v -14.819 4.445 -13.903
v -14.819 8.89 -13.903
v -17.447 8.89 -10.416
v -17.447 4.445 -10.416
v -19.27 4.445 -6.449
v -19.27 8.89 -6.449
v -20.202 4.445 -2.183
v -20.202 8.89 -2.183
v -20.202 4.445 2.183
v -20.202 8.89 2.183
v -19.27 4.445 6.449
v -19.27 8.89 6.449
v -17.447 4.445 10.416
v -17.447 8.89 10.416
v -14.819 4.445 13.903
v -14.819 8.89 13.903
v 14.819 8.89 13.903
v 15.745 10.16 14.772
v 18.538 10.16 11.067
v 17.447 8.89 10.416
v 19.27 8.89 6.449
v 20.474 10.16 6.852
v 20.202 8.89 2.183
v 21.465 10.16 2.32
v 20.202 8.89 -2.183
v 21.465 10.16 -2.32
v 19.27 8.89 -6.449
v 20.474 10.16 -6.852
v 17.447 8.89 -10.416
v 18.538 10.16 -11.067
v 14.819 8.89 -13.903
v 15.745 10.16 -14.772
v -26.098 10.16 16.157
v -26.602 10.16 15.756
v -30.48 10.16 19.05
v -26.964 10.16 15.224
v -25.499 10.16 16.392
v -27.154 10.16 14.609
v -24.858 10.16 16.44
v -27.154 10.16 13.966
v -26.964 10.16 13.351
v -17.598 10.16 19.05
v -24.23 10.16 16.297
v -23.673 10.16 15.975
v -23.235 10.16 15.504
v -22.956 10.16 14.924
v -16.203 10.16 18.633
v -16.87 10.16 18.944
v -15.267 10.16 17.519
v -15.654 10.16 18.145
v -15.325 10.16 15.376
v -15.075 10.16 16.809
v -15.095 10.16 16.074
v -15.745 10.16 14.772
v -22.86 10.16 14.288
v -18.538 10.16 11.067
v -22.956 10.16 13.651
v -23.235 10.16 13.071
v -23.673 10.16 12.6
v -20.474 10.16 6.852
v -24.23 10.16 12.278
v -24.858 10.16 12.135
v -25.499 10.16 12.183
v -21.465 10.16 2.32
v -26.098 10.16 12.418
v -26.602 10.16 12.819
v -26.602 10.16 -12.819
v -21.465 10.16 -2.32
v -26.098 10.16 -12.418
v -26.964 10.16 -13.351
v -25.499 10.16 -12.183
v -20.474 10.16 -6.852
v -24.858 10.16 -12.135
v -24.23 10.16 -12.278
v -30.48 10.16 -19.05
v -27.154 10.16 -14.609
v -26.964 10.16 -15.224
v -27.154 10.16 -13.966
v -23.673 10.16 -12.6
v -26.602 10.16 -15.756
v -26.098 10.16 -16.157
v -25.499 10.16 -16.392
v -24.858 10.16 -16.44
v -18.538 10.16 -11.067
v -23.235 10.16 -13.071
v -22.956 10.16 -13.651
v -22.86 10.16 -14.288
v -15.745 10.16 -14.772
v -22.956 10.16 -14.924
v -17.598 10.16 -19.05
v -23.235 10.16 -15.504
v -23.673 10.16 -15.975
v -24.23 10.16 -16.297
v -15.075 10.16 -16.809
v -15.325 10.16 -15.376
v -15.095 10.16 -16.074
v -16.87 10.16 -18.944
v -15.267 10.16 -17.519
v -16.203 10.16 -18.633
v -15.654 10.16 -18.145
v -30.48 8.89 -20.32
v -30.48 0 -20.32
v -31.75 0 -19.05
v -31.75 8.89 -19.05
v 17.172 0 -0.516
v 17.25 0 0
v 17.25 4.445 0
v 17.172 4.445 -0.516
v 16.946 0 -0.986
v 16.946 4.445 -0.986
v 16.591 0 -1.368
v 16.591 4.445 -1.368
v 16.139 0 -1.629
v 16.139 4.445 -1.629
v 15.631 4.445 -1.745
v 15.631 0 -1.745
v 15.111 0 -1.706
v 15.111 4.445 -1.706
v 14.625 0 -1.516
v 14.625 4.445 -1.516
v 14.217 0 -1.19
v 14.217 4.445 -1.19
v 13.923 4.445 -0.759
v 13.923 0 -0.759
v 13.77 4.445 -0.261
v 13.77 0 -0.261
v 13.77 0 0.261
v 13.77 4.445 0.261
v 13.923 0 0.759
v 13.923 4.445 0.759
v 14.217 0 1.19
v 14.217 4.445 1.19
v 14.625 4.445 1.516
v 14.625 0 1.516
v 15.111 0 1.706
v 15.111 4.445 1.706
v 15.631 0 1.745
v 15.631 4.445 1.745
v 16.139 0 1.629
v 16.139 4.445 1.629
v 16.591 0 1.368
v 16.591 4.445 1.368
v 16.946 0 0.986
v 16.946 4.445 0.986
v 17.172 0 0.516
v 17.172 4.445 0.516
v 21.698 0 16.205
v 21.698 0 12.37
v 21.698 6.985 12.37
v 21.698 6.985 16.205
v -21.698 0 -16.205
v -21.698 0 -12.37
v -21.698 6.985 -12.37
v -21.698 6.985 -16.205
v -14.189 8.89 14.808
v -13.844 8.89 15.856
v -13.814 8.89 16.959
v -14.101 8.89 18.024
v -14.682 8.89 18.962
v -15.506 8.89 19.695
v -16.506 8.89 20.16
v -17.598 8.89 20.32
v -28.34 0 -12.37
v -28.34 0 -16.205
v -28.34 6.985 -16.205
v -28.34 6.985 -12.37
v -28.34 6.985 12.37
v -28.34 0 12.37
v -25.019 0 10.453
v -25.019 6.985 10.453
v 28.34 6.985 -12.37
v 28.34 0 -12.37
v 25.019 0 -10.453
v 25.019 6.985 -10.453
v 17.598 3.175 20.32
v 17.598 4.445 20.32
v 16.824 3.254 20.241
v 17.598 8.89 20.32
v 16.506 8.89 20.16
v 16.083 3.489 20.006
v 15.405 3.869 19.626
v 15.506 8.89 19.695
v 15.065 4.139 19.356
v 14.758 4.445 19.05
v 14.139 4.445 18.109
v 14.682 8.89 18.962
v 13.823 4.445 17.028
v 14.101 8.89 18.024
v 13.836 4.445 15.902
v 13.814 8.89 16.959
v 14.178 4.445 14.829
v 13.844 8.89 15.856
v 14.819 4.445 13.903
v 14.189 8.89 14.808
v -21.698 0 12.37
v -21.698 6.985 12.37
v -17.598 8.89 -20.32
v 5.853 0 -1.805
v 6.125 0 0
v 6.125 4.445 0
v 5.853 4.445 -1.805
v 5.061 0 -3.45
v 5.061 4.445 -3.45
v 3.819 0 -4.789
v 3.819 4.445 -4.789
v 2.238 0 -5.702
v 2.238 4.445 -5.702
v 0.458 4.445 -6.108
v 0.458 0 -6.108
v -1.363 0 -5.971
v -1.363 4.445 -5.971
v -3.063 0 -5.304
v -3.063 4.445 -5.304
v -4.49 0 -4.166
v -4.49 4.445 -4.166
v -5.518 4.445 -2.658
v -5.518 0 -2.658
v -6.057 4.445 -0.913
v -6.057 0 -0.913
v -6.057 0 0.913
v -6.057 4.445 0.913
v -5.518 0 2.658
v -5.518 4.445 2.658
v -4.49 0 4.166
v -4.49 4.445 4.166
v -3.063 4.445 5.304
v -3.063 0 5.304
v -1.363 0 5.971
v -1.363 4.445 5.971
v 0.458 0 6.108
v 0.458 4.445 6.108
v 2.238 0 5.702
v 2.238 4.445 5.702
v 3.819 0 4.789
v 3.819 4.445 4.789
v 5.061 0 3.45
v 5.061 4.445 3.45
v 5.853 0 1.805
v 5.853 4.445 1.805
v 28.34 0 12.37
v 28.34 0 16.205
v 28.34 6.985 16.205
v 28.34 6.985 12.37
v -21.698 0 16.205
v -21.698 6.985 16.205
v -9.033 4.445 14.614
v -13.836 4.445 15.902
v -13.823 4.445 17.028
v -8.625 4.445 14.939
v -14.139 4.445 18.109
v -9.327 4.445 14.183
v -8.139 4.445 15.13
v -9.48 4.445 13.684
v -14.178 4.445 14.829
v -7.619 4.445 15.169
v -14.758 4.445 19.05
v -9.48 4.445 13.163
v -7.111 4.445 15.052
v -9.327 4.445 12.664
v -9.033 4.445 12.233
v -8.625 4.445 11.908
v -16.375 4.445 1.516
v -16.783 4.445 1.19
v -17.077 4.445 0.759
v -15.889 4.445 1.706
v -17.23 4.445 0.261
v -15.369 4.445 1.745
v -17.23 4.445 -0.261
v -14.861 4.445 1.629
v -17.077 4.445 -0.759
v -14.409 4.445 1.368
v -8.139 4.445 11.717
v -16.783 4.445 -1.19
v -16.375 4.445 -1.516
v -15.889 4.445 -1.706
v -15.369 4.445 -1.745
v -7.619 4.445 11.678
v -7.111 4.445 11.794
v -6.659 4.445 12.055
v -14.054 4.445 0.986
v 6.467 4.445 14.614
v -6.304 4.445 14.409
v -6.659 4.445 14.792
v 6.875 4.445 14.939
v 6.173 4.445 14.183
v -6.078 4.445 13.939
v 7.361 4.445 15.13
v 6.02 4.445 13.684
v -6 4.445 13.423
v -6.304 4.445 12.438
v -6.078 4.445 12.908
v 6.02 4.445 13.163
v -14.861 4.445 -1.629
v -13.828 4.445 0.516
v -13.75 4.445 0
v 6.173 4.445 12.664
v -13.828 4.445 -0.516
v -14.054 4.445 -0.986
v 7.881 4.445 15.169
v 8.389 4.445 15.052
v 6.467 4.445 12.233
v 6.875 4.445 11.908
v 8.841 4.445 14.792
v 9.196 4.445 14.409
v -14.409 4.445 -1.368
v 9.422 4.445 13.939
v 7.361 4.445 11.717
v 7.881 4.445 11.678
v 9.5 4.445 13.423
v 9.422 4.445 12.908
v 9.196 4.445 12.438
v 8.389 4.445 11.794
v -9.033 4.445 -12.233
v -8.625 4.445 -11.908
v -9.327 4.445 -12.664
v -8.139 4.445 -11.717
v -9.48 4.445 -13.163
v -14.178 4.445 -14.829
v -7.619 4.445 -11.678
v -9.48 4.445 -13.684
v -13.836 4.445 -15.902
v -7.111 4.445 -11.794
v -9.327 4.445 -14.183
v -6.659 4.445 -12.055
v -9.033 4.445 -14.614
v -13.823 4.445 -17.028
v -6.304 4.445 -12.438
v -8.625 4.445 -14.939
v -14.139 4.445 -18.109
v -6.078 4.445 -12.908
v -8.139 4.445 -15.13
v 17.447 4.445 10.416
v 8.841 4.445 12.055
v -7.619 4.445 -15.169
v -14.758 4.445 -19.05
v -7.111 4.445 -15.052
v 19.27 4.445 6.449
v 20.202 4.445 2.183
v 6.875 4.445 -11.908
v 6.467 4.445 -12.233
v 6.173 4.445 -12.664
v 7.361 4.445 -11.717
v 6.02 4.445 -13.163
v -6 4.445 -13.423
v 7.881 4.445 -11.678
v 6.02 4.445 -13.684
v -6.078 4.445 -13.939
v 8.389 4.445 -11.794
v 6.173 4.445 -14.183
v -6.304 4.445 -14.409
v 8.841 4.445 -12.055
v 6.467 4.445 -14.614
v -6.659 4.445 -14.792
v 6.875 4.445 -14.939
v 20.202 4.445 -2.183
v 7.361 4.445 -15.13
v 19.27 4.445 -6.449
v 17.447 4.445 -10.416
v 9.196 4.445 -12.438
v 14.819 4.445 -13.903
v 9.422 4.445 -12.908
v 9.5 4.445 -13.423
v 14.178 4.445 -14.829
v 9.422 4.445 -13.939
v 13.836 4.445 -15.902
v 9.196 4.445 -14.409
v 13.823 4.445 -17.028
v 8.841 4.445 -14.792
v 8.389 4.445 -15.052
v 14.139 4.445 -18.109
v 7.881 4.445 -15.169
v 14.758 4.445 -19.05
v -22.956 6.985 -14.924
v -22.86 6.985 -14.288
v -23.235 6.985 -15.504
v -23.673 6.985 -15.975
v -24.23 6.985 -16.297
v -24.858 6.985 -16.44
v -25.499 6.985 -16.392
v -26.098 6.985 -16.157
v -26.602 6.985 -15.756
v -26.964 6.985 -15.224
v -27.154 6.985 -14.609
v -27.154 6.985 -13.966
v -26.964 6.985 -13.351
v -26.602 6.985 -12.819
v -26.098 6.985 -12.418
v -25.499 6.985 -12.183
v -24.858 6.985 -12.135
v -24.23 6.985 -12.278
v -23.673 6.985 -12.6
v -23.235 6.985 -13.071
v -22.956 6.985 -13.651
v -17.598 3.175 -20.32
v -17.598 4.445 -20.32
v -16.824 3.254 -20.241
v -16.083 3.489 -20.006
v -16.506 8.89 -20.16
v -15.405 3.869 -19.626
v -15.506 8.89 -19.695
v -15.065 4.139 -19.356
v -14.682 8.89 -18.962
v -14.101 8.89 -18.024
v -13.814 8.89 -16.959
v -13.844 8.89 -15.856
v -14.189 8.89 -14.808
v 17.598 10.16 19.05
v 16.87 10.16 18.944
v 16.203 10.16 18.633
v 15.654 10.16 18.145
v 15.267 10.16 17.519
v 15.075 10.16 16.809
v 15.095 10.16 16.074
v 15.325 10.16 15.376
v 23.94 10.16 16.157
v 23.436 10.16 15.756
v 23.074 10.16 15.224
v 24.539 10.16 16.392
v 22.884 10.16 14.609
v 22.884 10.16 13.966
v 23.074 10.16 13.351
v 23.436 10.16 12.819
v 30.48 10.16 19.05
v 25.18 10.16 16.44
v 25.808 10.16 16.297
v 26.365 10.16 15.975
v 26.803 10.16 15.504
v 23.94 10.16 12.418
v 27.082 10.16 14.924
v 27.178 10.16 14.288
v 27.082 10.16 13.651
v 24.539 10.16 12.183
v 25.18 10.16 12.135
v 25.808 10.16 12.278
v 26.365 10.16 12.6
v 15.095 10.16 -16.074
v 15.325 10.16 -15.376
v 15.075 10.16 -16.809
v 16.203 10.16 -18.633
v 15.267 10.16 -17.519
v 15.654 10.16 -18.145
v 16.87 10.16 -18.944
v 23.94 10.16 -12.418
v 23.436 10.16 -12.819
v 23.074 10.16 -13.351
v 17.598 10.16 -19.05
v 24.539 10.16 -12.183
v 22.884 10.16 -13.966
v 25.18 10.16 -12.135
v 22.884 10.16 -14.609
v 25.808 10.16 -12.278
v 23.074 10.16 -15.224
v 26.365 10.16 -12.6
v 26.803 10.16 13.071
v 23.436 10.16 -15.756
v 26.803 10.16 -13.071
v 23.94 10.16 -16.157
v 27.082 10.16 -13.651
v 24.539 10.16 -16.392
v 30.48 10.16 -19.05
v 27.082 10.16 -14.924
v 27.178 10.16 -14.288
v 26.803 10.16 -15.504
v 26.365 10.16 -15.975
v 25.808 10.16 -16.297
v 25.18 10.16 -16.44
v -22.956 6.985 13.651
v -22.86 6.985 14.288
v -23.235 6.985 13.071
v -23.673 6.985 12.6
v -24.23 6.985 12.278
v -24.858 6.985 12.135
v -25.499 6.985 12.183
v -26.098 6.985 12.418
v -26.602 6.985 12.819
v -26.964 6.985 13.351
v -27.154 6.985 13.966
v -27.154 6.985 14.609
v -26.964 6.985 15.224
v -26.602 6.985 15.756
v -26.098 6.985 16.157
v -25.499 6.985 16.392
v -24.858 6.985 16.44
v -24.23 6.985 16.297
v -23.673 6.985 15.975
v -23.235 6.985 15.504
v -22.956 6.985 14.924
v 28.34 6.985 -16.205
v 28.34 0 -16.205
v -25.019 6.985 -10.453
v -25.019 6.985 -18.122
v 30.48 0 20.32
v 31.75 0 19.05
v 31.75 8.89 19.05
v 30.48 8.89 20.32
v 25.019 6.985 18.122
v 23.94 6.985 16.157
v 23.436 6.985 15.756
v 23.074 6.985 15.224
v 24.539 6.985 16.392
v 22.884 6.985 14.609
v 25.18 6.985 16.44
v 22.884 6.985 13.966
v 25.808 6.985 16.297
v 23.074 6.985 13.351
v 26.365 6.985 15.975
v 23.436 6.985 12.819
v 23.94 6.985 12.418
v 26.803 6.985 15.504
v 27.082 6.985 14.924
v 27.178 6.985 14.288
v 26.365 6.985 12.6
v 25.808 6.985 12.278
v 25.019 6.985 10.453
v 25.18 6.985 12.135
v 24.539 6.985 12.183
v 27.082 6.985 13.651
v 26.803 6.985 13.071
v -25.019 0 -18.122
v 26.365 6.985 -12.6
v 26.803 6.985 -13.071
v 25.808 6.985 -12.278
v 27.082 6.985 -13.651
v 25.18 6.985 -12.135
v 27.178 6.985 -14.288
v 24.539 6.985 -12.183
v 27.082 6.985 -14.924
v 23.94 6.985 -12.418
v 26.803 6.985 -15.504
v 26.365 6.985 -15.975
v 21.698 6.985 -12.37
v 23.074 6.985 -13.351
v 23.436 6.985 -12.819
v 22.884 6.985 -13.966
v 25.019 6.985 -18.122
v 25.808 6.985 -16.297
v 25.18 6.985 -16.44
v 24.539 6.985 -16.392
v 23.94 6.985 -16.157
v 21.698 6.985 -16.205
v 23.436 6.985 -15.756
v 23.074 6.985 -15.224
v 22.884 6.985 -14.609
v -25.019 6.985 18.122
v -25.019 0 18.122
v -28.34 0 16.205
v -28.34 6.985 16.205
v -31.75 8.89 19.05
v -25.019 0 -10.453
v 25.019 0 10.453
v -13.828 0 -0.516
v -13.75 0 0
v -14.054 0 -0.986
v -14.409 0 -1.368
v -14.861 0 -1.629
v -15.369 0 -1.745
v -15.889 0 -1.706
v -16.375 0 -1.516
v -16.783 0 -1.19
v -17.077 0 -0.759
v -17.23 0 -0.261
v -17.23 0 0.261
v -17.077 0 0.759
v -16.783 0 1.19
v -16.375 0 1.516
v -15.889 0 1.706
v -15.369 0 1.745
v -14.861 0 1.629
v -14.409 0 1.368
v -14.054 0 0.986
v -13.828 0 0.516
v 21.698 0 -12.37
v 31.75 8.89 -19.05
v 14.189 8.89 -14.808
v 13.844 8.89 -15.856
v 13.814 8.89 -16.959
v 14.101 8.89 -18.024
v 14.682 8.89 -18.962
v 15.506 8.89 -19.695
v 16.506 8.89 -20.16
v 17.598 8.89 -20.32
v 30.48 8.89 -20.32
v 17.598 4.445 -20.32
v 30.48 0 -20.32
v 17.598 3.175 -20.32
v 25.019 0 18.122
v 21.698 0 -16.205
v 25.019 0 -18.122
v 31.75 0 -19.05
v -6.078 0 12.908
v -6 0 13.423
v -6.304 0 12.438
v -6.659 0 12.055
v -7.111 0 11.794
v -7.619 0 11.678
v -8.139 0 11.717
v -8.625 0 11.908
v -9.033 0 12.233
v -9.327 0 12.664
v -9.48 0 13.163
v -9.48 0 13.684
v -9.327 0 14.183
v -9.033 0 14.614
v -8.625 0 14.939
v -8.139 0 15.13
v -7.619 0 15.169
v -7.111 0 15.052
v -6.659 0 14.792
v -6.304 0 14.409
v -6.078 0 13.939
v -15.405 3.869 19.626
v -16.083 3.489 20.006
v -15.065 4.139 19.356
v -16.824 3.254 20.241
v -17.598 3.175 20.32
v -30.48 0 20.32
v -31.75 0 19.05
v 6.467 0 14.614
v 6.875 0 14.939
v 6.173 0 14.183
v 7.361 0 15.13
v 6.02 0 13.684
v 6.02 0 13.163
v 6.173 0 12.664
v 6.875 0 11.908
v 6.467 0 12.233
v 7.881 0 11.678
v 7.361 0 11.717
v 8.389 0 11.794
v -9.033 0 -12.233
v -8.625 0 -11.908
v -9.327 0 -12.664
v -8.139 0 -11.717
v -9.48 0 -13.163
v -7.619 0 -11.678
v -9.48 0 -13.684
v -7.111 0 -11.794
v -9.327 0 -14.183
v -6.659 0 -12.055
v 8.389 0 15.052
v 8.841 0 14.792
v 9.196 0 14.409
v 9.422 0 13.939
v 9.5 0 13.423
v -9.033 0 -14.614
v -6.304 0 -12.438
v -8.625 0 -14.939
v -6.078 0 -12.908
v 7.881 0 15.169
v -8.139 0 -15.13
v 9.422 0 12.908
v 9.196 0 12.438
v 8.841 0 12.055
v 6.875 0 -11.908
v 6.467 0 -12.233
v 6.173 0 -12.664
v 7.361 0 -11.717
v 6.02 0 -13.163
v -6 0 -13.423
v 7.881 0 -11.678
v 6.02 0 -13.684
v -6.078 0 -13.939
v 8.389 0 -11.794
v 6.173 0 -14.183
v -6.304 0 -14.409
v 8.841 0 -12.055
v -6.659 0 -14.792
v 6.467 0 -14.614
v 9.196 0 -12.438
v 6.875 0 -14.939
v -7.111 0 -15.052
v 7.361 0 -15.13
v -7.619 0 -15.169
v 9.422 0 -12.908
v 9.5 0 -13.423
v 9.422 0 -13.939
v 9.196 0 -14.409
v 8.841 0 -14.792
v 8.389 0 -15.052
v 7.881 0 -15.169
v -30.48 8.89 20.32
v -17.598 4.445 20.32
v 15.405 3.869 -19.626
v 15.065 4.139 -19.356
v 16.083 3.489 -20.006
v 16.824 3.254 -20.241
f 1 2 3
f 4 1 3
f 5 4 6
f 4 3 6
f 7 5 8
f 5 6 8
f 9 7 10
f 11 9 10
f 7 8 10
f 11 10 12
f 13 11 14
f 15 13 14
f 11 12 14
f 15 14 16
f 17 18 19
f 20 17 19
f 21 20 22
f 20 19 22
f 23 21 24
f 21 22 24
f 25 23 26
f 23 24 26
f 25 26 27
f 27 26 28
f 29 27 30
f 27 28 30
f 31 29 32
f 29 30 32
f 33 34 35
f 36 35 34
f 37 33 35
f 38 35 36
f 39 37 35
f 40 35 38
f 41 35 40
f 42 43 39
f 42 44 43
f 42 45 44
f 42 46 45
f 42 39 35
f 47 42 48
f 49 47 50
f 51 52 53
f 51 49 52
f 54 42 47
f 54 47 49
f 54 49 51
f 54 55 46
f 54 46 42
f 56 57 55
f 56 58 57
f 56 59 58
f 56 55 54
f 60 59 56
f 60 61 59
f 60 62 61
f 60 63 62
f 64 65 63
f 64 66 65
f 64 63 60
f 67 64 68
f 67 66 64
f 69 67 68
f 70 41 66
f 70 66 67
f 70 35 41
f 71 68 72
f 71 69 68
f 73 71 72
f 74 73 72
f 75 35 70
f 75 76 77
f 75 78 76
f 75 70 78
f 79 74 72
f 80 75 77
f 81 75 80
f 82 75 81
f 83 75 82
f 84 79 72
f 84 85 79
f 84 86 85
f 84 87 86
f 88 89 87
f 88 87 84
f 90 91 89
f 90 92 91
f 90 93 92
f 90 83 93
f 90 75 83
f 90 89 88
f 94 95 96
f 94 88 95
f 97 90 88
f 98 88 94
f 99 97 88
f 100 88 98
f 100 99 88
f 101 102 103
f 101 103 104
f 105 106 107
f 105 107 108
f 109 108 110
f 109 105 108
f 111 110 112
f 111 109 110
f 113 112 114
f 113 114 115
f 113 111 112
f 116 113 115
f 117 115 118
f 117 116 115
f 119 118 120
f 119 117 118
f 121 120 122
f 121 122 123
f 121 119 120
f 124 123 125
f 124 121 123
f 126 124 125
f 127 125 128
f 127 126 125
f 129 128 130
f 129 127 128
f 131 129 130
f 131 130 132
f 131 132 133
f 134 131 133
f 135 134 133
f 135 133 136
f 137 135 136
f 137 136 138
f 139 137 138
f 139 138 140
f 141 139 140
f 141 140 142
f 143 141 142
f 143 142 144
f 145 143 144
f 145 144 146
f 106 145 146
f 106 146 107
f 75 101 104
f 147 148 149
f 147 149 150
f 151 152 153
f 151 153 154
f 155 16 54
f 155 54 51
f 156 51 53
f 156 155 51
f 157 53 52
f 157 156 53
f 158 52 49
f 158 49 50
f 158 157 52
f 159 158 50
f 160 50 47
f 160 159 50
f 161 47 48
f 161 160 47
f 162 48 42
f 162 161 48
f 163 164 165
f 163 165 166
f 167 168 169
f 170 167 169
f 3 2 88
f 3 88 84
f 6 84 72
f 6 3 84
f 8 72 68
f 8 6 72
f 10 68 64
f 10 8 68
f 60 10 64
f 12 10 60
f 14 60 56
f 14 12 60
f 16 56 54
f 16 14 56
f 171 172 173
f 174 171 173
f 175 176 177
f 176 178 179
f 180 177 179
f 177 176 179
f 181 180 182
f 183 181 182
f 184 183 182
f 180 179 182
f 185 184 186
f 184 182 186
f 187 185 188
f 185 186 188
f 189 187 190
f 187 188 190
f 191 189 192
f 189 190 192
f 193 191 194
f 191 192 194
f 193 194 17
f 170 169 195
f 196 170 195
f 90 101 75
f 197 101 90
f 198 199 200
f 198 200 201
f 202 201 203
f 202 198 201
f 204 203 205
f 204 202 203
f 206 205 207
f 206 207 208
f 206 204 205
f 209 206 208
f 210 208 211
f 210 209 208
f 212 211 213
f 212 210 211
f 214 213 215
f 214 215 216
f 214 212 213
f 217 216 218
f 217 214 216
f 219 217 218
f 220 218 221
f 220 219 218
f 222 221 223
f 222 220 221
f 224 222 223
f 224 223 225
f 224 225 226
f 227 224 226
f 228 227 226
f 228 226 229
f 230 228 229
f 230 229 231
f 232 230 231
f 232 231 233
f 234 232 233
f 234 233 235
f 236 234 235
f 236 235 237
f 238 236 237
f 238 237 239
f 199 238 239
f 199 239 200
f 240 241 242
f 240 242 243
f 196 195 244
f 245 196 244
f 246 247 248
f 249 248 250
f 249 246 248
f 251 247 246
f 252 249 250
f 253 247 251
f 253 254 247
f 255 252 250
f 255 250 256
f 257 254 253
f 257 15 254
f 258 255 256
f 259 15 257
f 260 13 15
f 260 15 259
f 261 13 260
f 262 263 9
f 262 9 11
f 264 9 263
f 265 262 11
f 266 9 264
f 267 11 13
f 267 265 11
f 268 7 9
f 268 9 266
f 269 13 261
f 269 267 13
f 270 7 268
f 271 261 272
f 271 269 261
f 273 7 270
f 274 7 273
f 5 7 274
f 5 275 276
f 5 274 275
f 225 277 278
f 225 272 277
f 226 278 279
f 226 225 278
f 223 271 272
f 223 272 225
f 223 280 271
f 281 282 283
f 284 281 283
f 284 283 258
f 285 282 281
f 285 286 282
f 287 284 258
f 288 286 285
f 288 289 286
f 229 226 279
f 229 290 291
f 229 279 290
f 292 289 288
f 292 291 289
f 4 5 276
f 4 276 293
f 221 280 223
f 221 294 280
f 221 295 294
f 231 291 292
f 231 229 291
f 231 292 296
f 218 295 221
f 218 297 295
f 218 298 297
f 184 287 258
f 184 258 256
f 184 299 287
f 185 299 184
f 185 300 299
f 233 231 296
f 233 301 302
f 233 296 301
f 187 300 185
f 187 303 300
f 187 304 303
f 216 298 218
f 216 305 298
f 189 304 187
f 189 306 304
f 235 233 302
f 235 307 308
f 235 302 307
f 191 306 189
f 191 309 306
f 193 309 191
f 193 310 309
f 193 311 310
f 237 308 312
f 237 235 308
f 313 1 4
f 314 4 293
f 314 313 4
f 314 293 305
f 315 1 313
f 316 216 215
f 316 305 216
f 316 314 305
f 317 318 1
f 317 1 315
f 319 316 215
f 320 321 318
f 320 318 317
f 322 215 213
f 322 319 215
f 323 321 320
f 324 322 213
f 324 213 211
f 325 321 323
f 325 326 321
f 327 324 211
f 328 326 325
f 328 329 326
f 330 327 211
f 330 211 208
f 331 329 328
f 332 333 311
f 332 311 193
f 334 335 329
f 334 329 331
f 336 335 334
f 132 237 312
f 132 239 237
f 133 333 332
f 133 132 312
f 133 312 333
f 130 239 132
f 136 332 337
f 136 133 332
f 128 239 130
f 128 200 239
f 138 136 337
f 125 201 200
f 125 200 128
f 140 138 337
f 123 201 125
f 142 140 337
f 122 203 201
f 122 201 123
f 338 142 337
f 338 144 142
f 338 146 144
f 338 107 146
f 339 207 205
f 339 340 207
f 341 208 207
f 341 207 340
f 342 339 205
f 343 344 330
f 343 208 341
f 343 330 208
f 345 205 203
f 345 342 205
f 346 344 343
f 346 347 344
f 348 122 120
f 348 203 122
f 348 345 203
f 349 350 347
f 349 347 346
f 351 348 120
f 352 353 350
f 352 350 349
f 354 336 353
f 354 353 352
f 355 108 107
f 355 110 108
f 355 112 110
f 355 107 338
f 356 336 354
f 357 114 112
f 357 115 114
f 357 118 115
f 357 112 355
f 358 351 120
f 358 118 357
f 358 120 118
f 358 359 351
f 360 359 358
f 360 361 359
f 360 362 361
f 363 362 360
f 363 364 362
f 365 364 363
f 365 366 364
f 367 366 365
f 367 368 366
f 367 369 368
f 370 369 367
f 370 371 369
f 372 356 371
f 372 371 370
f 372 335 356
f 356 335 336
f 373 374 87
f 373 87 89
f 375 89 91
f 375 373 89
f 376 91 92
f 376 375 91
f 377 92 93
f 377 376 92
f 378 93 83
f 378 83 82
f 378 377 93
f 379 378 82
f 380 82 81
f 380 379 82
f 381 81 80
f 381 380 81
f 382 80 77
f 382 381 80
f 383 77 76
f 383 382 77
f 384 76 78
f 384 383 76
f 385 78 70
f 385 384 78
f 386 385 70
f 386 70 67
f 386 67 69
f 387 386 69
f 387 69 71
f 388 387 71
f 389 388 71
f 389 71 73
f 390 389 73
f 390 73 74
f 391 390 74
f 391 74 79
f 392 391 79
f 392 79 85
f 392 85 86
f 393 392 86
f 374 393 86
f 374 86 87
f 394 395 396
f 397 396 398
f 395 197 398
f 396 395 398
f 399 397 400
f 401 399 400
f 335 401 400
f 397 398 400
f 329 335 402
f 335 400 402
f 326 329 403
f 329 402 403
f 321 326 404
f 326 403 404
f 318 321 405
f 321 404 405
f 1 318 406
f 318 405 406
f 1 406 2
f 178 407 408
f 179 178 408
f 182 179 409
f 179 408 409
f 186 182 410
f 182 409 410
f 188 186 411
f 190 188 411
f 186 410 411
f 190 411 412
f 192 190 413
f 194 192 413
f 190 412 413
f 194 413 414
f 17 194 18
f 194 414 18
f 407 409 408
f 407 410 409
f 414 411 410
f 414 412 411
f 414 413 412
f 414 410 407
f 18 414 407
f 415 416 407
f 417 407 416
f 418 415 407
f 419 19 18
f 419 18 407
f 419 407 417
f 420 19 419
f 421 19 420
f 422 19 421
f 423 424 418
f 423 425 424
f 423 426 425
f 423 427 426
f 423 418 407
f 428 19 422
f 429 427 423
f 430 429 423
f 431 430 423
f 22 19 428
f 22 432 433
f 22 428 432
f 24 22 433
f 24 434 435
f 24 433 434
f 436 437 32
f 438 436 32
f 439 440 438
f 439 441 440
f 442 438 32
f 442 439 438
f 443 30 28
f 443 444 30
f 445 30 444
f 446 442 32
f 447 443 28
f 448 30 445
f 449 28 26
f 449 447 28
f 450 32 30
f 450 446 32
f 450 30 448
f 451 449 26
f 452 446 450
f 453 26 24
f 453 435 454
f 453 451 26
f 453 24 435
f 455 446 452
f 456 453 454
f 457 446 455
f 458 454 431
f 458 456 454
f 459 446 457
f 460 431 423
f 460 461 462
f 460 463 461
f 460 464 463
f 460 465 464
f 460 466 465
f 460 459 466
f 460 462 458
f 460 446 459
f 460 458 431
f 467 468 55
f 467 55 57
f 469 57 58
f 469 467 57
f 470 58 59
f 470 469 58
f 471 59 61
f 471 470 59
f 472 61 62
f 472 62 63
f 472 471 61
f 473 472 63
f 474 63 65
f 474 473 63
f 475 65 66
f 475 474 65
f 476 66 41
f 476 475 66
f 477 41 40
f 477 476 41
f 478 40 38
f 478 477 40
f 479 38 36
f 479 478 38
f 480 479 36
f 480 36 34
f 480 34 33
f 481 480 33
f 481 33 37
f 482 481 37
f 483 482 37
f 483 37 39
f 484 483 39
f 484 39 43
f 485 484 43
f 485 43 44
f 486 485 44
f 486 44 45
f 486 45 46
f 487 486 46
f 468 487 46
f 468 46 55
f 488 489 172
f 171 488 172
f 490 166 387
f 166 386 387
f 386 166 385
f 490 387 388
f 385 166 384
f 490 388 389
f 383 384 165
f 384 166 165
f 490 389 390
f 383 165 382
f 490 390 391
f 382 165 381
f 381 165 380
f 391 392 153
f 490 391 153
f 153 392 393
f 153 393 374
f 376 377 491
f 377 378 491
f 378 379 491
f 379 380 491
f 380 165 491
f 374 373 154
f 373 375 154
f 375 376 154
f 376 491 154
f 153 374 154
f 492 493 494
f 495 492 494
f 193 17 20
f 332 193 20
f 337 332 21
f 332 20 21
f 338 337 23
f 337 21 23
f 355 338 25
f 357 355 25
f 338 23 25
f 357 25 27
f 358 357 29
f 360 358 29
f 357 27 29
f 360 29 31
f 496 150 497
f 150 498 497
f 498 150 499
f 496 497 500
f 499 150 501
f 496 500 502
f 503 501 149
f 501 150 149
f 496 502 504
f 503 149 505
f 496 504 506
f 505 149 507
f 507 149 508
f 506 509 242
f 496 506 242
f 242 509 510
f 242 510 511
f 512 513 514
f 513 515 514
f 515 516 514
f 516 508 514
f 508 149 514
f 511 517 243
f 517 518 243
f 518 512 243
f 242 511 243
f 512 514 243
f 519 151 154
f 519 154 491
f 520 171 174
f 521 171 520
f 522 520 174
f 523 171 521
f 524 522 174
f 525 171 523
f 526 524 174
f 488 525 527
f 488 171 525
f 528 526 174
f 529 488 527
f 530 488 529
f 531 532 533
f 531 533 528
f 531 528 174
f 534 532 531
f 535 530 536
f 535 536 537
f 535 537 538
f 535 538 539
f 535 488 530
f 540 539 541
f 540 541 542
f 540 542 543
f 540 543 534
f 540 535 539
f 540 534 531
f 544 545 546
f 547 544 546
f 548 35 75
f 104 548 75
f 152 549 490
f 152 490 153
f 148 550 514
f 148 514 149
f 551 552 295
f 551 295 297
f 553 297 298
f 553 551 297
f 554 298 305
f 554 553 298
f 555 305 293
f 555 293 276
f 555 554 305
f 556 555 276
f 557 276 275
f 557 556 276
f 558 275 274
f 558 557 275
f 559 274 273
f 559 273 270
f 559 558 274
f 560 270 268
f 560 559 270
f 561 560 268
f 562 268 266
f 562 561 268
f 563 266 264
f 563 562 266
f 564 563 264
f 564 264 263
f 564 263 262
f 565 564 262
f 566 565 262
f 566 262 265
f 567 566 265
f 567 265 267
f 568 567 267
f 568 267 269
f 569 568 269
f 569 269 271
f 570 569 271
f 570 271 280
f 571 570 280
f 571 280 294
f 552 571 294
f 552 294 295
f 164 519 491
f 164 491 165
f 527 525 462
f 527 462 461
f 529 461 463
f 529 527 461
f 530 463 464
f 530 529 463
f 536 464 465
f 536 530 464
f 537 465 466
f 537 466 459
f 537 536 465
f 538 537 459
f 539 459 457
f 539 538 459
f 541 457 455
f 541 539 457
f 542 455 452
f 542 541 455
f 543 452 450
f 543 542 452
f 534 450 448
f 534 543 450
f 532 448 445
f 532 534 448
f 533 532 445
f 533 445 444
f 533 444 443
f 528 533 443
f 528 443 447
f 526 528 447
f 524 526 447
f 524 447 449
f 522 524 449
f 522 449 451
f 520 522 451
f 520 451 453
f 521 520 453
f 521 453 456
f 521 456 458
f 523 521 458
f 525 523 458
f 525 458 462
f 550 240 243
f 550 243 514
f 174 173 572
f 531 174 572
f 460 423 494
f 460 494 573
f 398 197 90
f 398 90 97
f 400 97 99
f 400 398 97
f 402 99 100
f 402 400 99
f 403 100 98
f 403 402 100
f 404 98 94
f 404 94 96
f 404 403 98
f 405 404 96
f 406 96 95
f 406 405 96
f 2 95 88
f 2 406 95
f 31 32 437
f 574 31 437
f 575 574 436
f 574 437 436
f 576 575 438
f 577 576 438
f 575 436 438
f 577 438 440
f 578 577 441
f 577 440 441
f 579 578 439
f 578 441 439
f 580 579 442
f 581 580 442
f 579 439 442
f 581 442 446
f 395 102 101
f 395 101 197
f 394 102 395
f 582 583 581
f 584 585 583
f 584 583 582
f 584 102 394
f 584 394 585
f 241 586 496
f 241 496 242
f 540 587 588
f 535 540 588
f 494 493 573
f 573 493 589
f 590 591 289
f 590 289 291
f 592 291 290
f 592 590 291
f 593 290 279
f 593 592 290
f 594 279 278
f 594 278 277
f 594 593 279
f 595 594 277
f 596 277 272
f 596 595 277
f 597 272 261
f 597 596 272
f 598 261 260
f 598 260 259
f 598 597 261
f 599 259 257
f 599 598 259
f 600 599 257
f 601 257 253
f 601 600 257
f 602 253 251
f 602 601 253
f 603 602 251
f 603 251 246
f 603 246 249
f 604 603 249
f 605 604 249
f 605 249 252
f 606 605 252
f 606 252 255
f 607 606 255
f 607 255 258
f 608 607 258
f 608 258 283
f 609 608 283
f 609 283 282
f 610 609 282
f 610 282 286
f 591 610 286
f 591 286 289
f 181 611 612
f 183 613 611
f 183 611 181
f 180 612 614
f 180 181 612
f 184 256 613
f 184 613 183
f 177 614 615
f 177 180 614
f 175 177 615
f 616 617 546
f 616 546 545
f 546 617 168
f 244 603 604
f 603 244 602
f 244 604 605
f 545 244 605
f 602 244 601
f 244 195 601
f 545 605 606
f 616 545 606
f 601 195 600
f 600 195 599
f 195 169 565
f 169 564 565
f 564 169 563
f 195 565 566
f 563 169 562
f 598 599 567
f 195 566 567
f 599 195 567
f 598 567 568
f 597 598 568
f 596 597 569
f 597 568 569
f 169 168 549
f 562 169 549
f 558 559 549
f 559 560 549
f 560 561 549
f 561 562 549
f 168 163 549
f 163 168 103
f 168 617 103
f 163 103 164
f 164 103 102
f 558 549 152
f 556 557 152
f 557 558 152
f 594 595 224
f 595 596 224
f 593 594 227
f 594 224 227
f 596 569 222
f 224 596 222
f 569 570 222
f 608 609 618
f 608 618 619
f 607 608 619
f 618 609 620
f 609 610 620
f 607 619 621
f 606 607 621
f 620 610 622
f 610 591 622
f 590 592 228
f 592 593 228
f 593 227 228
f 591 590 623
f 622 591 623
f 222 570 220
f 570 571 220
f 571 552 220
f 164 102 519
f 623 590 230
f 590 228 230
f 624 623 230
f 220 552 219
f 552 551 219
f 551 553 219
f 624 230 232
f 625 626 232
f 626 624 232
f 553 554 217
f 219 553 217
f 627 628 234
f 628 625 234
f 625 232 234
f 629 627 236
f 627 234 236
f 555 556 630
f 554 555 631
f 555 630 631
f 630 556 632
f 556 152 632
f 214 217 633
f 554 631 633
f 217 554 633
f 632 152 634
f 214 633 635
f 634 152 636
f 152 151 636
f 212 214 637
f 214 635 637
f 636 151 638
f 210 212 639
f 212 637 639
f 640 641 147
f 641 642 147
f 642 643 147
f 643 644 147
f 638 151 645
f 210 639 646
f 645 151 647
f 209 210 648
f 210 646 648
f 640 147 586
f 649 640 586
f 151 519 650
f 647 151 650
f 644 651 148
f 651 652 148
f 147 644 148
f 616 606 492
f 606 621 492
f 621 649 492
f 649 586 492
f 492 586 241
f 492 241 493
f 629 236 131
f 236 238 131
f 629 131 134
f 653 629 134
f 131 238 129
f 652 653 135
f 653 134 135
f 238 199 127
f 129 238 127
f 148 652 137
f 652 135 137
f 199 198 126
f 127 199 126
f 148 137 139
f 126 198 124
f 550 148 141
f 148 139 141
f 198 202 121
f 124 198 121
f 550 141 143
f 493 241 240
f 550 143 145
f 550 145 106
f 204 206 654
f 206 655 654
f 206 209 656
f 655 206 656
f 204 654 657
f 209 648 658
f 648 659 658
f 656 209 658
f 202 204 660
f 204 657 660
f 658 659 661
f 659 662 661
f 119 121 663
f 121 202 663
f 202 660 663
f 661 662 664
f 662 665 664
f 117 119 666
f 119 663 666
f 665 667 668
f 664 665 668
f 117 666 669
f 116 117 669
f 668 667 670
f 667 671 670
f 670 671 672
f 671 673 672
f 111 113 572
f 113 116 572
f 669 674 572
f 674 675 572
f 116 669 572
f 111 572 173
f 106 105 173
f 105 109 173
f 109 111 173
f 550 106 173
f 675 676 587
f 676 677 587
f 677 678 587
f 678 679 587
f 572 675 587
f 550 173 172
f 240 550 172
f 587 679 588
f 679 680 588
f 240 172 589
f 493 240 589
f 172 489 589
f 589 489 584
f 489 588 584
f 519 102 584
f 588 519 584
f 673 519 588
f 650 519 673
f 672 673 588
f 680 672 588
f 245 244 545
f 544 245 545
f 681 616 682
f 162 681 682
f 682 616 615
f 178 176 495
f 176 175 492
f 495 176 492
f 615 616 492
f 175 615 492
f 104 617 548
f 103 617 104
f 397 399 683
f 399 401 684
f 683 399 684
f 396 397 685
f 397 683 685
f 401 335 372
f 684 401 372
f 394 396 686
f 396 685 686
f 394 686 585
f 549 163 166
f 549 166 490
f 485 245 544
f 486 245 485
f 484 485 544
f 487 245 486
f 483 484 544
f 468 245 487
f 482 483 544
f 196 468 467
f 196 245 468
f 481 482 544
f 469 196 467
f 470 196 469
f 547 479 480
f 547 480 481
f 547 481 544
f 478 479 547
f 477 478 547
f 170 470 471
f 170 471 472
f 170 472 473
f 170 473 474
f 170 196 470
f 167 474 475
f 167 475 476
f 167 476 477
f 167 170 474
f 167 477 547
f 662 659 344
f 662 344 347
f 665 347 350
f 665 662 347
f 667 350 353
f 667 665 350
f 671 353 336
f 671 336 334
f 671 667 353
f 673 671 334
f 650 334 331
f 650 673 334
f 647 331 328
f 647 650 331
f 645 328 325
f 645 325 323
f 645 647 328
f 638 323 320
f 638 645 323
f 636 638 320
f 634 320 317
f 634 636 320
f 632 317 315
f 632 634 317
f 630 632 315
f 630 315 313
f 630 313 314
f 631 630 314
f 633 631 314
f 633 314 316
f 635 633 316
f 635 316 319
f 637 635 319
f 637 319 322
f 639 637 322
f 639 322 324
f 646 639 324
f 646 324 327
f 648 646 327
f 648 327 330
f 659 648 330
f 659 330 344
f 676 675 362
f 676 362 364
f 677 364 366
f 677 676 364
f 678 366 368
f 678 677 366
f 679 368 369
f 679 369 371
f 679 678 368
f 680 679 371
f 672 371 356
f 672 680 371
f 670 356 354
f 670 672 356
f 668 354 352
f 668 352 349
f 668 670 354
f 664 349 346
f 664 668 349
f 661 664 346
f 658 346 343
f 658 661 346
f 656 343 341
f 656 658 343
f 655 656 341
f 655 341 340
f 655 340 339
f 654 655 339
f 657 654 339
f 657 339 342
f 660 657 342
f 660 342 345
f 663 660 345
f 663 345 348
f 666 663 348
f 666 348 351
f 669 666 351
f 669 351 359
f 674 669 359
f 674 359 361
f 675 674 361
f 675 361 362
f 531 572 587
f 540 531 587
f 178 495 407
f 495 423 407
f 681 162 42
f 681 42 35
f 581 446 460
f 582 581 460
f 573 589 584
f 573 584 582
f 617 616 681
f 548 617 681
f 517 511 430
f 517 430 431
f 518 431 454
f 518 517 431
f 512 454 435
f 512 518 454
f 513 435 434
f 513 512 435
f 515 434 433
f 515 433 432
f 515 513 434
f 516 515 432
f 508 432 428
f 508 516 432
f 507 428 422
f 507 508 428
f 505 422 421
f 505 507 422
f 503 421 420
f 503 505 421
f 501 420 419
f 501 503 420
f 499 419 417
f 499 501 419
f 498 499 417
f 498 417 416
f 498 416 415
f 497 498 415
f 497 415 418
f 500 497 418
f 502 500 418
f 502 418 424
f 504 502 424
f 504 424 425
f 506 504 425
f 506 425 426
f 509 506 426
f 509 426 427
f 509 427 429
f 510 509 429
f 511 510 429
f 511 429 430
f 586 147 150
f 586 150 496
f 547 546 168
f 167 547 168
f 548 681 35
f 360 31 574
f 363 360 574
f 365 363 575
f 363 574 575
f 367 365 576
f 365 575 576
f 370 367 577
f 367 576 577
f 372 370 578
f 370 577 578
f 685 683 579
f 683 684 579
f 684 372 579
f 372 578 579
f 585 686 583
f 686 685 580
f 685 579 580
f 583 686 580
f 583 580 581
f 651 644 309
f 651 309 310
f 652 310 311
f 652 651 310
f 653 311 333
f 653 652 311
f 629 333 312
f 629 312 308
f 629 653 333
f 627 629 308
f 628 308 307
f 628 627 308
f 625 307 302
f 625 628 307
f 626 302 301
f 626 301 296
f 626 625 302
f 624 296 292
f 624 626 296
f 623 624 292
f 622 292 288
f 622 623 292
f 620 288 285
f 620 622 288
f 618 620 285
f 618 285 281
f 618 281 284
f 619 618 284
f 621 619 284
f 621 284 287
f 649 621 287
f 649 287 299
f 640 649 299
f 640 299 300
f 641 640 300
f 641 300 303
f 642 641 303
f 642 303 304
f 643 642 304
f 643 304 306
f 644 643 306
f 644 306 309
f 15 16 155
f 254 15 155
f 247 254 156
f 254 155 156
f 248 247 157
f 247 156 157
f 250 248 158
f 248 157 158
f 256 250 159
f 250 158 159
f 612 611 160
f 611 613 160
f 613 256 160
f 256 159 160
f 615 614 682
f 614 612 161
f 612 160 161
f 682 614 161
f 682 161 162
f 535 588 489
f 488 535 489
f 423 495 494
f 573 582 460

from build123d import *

# Parameters (mm, degrees)
SKETCH2_W           = 63.5
SKETCH2_H           = 40.64
SKETCH2_R           = 2.159
SKETCH2_R_2         = 6.125
SKETCH2_R_3         = 1.75
BOSS_EXTRUDE2_DEPTH = 10.16
SKETCH2_4_R         = 2.159
CUT_EXTRUDE1_DEPTH  = 6.985
SKETCH3_R           = 1.75
SKETCH3_R_2         = 6.125
CUT_EXTRUDE2_DEPTH  = 5.715
CHAMFER1_SIZE       = 1.27


with BuildPart() as part:
    # Sketch2 → Boss-Extrude2 (new body)
    with BuildSketch(Plane(origin=(0, 0, 0), x_dir=(1, 0, 0), z_dir=(0, 1, 0))):
        Rectangle(SKETCH2_W, SKETCH2_H)
        with Locations((-25.019, 14.2875)):
            Circle(SKETCH2_R, mode=Mode.SUBTRACT)
        with Locations((25.019, 14.2875)):
            Circle(SKETCH2_R, mode=Mode.SUBTRACT)
        with Locations((25.019, -14.2875)):
            Circle(SKETCH2_R, mode=Mode.SUBTRACT)
        with Locations((-25.019, -14.2875)):
            Circle(SKETCH2_R, mode=Mode.SUBTRACT)
        Circle(SKETCH2_R_2, mode=Mode.SUBTRACT)
        with Locations((7.75, 13.423393759)):
            Circle(SKETCH2_R_3, mode=Mode.SUBTRACT)
        with Locations((15.5, 0)):
            Circle(SKETCH2_R_3, mode=Mode.SUBTRACT)
        with Locations((7.75, -13.423393759)):
            Circle(SKETCH2_R_3, mode=Mode.SUBTRACT)
        with Locations((-7.75, -13.423393759)):
            Circle(SKETCH2_R_3, mode=Mode.SUBTRACT)
        with Locations((-15.5, 0)):
            Circle(SKETCH2_R_3, mode=Mode.SUBTRACT)
        with Locations((-7.75, 13.423393759)):
            Circle(SKETCH2_R_3, mode=Mode.SUBTRACT)
    extrude(amount=BOSS_EXTRUDE2_DEPTH)

    # Sketch2_4 → Cut-Extrude1 (cut)
    with BuildSketch(Plane(origin=(0, 0, 0), x_dir=(1, 0, 0), z_dir=(0, 1, 0))):
        Polygon((-25.019, -10.452681777), (-21.69795, -12.370090889), (-21.69795, -16.204909111), (-25.019, -18.122318223), (-28.34005, -16.204909111), (-28.34005, -12.370090889), align=None)
        with Locations((-25.019, -14.2875)):
            Circle(SKETCH2_4_R, mode=Mode.SUBTRACT)
        Polygon((28.34005, -16.204909111), (28.34005, -12.370090889), (25.019, -10.452681777), (21.69795, -12.370090889), (21.69795, -16.204909111), (25.019, -18.122318223), align=None)
        with Locations((25.019, -14.2875)):
            Circle(SKETCH2_4_R, mode=Mode.SUBTRACT)
        Polygon((25.019, 10.452681777), (21.69795, 12.370090889), (21.69795, 16.204909111), (25.019, 18.122318223), (28.34005, 16.204909111), (28.34005, 12.370090889), align=None)
        with Locations((25.019, 14.2875)):
            Circle(SKETCH2_4_R, mode=Mode.SUBTRACT)
        Polygon((-28.34005, 16.204909111), (-28.34005, 12.370090889), (-25.019, 10.452681777), (-21.69795, 12.370090889), (-21.69795, 16.204909111), (-25.019, 18.122318223), align=None)
        with Locations((-25.019, 14.2875)):
            Circle(SKETCH2_4_R, mode=Mode.SUBTRACT)
    extrude(amount=CUT_EXTRUDE1_DEPTH, mode=Mode.SUBTRACT)

    # Sketch3 → Cut-Extrude2 (cut)
    with BuildSketch(Plane(origin=(0, 10.16, 0), x_dir=(1, 0, 0), z_dir=(0, 1, 0))):
        with BuildLine():
            Line((17.597636205, 20.32), (-17.597636205, 20.32))
            ThreePointArc((-17.597636205, 20.32), (-14.101340421, 18.023940484), (-14.819062067, 13.903157895))
            ThreePointArc((-14.819062067, 13.903157895), (-20.32, 0), (-14.819062067, -13.903157895))
            ThreePointArc((-14.819062067, -13.903157895), (-14.101340421, -18.023940484), (-17.597636205, -20.32))
            Line((-17.597636205, -20.32), (17.597636205, -20.32))
            ThreePointArc((17.597636205, -20.32), (14.101340421, -18.023940484), (14.819062067, -13.903157895))
            ThreePointArc((14.819062067, -13.903157895), (20.32, 0), (14.819062067, 13.903157895))
            ThreePointArc((14.819062067, 13.903157895), (14.101340421, 18.023940484), (17.597636205, 20.32))
        make_face()
        with Locations((-15.5, 0)):
            Circle(SKETCH3_R, mode=Mode.SUBTRACT)
        with Locations((-7.75, -13.423393759)):
            Circle(SKETCH3_R, mode=Mode.SUBTRACT)
        with Locations((7.75, -13.423393759)):
            Circle(SKETCH3_R, mode=Mode.SUBTRACT)
        Circle(SKETCH3_R_2, mode=Mode.SUBTRACT)
        with Locations((15.5, 0)):
            Circle(SKETCH3_R, mode=Mode.SUBTRACT)
        with Locations((-7.75, 13.423393759)):
            Circle(SKETCH3_R, mode=Mode.SUBTRACT)
        with Locations((7.75, 13.423393759)):
            Circle(SKETCH3_R, mode=Mode.SUBTRACT)
        Polygon((-18.310773436, 40.893260665), (-17.597636205, 20.32), (17.597636205, 20.32), (17.597636205, 38.276075745), align=None)
        Polygon((17.597636205, -20.32), (-17.597636205, -20.32), (-25.350098393, -30.312218712), (-13.787636205, -33.380642411), (4.251165531, -33.380642411), (18.013202248, -32.308644201), align=None)
    extrude(amount=-CUT_EXTRUDE2_DEPTH, mode=Mode.SUBTRACT)

    # Chamfer1
    chamfer1_edges = [part.edges().sort_by_distance(p)[0] for p in [
        (24.673818102, 10.16, -20.32),
        (24.673818102, 10.16, 20.32),
        (0, 4.445, -20.32),
        (-20.32, 10.16, 0),
        (-14.101340421, 10.16, 18.023940484),
        (14.101340421, 10.16, -18.023940484),
        (20.32, 10.16, 0),
        (14.101340421, 10.16, 18.023940484),
        (-14.101340421, 10.16, -18.023940484),
        (0, 4.445, 20.32),
        (31.75, 5.08, 20.32),
        (-31.75, 5.08, 20.32),
        (-31.75, 5.08, -20.32),
        (31.75, 5.08, -20.32),
        (31.75, 10.16, 0),
        (-24.673818102, 10.16, -20.32),
        (-31.75, 10.16, 0),
        (-24.673818102, 10.16, 20.32),
    ]]
    chamfer(chamfer1_edges, length=CHAMFER1_SIZE)


solid = part.part
